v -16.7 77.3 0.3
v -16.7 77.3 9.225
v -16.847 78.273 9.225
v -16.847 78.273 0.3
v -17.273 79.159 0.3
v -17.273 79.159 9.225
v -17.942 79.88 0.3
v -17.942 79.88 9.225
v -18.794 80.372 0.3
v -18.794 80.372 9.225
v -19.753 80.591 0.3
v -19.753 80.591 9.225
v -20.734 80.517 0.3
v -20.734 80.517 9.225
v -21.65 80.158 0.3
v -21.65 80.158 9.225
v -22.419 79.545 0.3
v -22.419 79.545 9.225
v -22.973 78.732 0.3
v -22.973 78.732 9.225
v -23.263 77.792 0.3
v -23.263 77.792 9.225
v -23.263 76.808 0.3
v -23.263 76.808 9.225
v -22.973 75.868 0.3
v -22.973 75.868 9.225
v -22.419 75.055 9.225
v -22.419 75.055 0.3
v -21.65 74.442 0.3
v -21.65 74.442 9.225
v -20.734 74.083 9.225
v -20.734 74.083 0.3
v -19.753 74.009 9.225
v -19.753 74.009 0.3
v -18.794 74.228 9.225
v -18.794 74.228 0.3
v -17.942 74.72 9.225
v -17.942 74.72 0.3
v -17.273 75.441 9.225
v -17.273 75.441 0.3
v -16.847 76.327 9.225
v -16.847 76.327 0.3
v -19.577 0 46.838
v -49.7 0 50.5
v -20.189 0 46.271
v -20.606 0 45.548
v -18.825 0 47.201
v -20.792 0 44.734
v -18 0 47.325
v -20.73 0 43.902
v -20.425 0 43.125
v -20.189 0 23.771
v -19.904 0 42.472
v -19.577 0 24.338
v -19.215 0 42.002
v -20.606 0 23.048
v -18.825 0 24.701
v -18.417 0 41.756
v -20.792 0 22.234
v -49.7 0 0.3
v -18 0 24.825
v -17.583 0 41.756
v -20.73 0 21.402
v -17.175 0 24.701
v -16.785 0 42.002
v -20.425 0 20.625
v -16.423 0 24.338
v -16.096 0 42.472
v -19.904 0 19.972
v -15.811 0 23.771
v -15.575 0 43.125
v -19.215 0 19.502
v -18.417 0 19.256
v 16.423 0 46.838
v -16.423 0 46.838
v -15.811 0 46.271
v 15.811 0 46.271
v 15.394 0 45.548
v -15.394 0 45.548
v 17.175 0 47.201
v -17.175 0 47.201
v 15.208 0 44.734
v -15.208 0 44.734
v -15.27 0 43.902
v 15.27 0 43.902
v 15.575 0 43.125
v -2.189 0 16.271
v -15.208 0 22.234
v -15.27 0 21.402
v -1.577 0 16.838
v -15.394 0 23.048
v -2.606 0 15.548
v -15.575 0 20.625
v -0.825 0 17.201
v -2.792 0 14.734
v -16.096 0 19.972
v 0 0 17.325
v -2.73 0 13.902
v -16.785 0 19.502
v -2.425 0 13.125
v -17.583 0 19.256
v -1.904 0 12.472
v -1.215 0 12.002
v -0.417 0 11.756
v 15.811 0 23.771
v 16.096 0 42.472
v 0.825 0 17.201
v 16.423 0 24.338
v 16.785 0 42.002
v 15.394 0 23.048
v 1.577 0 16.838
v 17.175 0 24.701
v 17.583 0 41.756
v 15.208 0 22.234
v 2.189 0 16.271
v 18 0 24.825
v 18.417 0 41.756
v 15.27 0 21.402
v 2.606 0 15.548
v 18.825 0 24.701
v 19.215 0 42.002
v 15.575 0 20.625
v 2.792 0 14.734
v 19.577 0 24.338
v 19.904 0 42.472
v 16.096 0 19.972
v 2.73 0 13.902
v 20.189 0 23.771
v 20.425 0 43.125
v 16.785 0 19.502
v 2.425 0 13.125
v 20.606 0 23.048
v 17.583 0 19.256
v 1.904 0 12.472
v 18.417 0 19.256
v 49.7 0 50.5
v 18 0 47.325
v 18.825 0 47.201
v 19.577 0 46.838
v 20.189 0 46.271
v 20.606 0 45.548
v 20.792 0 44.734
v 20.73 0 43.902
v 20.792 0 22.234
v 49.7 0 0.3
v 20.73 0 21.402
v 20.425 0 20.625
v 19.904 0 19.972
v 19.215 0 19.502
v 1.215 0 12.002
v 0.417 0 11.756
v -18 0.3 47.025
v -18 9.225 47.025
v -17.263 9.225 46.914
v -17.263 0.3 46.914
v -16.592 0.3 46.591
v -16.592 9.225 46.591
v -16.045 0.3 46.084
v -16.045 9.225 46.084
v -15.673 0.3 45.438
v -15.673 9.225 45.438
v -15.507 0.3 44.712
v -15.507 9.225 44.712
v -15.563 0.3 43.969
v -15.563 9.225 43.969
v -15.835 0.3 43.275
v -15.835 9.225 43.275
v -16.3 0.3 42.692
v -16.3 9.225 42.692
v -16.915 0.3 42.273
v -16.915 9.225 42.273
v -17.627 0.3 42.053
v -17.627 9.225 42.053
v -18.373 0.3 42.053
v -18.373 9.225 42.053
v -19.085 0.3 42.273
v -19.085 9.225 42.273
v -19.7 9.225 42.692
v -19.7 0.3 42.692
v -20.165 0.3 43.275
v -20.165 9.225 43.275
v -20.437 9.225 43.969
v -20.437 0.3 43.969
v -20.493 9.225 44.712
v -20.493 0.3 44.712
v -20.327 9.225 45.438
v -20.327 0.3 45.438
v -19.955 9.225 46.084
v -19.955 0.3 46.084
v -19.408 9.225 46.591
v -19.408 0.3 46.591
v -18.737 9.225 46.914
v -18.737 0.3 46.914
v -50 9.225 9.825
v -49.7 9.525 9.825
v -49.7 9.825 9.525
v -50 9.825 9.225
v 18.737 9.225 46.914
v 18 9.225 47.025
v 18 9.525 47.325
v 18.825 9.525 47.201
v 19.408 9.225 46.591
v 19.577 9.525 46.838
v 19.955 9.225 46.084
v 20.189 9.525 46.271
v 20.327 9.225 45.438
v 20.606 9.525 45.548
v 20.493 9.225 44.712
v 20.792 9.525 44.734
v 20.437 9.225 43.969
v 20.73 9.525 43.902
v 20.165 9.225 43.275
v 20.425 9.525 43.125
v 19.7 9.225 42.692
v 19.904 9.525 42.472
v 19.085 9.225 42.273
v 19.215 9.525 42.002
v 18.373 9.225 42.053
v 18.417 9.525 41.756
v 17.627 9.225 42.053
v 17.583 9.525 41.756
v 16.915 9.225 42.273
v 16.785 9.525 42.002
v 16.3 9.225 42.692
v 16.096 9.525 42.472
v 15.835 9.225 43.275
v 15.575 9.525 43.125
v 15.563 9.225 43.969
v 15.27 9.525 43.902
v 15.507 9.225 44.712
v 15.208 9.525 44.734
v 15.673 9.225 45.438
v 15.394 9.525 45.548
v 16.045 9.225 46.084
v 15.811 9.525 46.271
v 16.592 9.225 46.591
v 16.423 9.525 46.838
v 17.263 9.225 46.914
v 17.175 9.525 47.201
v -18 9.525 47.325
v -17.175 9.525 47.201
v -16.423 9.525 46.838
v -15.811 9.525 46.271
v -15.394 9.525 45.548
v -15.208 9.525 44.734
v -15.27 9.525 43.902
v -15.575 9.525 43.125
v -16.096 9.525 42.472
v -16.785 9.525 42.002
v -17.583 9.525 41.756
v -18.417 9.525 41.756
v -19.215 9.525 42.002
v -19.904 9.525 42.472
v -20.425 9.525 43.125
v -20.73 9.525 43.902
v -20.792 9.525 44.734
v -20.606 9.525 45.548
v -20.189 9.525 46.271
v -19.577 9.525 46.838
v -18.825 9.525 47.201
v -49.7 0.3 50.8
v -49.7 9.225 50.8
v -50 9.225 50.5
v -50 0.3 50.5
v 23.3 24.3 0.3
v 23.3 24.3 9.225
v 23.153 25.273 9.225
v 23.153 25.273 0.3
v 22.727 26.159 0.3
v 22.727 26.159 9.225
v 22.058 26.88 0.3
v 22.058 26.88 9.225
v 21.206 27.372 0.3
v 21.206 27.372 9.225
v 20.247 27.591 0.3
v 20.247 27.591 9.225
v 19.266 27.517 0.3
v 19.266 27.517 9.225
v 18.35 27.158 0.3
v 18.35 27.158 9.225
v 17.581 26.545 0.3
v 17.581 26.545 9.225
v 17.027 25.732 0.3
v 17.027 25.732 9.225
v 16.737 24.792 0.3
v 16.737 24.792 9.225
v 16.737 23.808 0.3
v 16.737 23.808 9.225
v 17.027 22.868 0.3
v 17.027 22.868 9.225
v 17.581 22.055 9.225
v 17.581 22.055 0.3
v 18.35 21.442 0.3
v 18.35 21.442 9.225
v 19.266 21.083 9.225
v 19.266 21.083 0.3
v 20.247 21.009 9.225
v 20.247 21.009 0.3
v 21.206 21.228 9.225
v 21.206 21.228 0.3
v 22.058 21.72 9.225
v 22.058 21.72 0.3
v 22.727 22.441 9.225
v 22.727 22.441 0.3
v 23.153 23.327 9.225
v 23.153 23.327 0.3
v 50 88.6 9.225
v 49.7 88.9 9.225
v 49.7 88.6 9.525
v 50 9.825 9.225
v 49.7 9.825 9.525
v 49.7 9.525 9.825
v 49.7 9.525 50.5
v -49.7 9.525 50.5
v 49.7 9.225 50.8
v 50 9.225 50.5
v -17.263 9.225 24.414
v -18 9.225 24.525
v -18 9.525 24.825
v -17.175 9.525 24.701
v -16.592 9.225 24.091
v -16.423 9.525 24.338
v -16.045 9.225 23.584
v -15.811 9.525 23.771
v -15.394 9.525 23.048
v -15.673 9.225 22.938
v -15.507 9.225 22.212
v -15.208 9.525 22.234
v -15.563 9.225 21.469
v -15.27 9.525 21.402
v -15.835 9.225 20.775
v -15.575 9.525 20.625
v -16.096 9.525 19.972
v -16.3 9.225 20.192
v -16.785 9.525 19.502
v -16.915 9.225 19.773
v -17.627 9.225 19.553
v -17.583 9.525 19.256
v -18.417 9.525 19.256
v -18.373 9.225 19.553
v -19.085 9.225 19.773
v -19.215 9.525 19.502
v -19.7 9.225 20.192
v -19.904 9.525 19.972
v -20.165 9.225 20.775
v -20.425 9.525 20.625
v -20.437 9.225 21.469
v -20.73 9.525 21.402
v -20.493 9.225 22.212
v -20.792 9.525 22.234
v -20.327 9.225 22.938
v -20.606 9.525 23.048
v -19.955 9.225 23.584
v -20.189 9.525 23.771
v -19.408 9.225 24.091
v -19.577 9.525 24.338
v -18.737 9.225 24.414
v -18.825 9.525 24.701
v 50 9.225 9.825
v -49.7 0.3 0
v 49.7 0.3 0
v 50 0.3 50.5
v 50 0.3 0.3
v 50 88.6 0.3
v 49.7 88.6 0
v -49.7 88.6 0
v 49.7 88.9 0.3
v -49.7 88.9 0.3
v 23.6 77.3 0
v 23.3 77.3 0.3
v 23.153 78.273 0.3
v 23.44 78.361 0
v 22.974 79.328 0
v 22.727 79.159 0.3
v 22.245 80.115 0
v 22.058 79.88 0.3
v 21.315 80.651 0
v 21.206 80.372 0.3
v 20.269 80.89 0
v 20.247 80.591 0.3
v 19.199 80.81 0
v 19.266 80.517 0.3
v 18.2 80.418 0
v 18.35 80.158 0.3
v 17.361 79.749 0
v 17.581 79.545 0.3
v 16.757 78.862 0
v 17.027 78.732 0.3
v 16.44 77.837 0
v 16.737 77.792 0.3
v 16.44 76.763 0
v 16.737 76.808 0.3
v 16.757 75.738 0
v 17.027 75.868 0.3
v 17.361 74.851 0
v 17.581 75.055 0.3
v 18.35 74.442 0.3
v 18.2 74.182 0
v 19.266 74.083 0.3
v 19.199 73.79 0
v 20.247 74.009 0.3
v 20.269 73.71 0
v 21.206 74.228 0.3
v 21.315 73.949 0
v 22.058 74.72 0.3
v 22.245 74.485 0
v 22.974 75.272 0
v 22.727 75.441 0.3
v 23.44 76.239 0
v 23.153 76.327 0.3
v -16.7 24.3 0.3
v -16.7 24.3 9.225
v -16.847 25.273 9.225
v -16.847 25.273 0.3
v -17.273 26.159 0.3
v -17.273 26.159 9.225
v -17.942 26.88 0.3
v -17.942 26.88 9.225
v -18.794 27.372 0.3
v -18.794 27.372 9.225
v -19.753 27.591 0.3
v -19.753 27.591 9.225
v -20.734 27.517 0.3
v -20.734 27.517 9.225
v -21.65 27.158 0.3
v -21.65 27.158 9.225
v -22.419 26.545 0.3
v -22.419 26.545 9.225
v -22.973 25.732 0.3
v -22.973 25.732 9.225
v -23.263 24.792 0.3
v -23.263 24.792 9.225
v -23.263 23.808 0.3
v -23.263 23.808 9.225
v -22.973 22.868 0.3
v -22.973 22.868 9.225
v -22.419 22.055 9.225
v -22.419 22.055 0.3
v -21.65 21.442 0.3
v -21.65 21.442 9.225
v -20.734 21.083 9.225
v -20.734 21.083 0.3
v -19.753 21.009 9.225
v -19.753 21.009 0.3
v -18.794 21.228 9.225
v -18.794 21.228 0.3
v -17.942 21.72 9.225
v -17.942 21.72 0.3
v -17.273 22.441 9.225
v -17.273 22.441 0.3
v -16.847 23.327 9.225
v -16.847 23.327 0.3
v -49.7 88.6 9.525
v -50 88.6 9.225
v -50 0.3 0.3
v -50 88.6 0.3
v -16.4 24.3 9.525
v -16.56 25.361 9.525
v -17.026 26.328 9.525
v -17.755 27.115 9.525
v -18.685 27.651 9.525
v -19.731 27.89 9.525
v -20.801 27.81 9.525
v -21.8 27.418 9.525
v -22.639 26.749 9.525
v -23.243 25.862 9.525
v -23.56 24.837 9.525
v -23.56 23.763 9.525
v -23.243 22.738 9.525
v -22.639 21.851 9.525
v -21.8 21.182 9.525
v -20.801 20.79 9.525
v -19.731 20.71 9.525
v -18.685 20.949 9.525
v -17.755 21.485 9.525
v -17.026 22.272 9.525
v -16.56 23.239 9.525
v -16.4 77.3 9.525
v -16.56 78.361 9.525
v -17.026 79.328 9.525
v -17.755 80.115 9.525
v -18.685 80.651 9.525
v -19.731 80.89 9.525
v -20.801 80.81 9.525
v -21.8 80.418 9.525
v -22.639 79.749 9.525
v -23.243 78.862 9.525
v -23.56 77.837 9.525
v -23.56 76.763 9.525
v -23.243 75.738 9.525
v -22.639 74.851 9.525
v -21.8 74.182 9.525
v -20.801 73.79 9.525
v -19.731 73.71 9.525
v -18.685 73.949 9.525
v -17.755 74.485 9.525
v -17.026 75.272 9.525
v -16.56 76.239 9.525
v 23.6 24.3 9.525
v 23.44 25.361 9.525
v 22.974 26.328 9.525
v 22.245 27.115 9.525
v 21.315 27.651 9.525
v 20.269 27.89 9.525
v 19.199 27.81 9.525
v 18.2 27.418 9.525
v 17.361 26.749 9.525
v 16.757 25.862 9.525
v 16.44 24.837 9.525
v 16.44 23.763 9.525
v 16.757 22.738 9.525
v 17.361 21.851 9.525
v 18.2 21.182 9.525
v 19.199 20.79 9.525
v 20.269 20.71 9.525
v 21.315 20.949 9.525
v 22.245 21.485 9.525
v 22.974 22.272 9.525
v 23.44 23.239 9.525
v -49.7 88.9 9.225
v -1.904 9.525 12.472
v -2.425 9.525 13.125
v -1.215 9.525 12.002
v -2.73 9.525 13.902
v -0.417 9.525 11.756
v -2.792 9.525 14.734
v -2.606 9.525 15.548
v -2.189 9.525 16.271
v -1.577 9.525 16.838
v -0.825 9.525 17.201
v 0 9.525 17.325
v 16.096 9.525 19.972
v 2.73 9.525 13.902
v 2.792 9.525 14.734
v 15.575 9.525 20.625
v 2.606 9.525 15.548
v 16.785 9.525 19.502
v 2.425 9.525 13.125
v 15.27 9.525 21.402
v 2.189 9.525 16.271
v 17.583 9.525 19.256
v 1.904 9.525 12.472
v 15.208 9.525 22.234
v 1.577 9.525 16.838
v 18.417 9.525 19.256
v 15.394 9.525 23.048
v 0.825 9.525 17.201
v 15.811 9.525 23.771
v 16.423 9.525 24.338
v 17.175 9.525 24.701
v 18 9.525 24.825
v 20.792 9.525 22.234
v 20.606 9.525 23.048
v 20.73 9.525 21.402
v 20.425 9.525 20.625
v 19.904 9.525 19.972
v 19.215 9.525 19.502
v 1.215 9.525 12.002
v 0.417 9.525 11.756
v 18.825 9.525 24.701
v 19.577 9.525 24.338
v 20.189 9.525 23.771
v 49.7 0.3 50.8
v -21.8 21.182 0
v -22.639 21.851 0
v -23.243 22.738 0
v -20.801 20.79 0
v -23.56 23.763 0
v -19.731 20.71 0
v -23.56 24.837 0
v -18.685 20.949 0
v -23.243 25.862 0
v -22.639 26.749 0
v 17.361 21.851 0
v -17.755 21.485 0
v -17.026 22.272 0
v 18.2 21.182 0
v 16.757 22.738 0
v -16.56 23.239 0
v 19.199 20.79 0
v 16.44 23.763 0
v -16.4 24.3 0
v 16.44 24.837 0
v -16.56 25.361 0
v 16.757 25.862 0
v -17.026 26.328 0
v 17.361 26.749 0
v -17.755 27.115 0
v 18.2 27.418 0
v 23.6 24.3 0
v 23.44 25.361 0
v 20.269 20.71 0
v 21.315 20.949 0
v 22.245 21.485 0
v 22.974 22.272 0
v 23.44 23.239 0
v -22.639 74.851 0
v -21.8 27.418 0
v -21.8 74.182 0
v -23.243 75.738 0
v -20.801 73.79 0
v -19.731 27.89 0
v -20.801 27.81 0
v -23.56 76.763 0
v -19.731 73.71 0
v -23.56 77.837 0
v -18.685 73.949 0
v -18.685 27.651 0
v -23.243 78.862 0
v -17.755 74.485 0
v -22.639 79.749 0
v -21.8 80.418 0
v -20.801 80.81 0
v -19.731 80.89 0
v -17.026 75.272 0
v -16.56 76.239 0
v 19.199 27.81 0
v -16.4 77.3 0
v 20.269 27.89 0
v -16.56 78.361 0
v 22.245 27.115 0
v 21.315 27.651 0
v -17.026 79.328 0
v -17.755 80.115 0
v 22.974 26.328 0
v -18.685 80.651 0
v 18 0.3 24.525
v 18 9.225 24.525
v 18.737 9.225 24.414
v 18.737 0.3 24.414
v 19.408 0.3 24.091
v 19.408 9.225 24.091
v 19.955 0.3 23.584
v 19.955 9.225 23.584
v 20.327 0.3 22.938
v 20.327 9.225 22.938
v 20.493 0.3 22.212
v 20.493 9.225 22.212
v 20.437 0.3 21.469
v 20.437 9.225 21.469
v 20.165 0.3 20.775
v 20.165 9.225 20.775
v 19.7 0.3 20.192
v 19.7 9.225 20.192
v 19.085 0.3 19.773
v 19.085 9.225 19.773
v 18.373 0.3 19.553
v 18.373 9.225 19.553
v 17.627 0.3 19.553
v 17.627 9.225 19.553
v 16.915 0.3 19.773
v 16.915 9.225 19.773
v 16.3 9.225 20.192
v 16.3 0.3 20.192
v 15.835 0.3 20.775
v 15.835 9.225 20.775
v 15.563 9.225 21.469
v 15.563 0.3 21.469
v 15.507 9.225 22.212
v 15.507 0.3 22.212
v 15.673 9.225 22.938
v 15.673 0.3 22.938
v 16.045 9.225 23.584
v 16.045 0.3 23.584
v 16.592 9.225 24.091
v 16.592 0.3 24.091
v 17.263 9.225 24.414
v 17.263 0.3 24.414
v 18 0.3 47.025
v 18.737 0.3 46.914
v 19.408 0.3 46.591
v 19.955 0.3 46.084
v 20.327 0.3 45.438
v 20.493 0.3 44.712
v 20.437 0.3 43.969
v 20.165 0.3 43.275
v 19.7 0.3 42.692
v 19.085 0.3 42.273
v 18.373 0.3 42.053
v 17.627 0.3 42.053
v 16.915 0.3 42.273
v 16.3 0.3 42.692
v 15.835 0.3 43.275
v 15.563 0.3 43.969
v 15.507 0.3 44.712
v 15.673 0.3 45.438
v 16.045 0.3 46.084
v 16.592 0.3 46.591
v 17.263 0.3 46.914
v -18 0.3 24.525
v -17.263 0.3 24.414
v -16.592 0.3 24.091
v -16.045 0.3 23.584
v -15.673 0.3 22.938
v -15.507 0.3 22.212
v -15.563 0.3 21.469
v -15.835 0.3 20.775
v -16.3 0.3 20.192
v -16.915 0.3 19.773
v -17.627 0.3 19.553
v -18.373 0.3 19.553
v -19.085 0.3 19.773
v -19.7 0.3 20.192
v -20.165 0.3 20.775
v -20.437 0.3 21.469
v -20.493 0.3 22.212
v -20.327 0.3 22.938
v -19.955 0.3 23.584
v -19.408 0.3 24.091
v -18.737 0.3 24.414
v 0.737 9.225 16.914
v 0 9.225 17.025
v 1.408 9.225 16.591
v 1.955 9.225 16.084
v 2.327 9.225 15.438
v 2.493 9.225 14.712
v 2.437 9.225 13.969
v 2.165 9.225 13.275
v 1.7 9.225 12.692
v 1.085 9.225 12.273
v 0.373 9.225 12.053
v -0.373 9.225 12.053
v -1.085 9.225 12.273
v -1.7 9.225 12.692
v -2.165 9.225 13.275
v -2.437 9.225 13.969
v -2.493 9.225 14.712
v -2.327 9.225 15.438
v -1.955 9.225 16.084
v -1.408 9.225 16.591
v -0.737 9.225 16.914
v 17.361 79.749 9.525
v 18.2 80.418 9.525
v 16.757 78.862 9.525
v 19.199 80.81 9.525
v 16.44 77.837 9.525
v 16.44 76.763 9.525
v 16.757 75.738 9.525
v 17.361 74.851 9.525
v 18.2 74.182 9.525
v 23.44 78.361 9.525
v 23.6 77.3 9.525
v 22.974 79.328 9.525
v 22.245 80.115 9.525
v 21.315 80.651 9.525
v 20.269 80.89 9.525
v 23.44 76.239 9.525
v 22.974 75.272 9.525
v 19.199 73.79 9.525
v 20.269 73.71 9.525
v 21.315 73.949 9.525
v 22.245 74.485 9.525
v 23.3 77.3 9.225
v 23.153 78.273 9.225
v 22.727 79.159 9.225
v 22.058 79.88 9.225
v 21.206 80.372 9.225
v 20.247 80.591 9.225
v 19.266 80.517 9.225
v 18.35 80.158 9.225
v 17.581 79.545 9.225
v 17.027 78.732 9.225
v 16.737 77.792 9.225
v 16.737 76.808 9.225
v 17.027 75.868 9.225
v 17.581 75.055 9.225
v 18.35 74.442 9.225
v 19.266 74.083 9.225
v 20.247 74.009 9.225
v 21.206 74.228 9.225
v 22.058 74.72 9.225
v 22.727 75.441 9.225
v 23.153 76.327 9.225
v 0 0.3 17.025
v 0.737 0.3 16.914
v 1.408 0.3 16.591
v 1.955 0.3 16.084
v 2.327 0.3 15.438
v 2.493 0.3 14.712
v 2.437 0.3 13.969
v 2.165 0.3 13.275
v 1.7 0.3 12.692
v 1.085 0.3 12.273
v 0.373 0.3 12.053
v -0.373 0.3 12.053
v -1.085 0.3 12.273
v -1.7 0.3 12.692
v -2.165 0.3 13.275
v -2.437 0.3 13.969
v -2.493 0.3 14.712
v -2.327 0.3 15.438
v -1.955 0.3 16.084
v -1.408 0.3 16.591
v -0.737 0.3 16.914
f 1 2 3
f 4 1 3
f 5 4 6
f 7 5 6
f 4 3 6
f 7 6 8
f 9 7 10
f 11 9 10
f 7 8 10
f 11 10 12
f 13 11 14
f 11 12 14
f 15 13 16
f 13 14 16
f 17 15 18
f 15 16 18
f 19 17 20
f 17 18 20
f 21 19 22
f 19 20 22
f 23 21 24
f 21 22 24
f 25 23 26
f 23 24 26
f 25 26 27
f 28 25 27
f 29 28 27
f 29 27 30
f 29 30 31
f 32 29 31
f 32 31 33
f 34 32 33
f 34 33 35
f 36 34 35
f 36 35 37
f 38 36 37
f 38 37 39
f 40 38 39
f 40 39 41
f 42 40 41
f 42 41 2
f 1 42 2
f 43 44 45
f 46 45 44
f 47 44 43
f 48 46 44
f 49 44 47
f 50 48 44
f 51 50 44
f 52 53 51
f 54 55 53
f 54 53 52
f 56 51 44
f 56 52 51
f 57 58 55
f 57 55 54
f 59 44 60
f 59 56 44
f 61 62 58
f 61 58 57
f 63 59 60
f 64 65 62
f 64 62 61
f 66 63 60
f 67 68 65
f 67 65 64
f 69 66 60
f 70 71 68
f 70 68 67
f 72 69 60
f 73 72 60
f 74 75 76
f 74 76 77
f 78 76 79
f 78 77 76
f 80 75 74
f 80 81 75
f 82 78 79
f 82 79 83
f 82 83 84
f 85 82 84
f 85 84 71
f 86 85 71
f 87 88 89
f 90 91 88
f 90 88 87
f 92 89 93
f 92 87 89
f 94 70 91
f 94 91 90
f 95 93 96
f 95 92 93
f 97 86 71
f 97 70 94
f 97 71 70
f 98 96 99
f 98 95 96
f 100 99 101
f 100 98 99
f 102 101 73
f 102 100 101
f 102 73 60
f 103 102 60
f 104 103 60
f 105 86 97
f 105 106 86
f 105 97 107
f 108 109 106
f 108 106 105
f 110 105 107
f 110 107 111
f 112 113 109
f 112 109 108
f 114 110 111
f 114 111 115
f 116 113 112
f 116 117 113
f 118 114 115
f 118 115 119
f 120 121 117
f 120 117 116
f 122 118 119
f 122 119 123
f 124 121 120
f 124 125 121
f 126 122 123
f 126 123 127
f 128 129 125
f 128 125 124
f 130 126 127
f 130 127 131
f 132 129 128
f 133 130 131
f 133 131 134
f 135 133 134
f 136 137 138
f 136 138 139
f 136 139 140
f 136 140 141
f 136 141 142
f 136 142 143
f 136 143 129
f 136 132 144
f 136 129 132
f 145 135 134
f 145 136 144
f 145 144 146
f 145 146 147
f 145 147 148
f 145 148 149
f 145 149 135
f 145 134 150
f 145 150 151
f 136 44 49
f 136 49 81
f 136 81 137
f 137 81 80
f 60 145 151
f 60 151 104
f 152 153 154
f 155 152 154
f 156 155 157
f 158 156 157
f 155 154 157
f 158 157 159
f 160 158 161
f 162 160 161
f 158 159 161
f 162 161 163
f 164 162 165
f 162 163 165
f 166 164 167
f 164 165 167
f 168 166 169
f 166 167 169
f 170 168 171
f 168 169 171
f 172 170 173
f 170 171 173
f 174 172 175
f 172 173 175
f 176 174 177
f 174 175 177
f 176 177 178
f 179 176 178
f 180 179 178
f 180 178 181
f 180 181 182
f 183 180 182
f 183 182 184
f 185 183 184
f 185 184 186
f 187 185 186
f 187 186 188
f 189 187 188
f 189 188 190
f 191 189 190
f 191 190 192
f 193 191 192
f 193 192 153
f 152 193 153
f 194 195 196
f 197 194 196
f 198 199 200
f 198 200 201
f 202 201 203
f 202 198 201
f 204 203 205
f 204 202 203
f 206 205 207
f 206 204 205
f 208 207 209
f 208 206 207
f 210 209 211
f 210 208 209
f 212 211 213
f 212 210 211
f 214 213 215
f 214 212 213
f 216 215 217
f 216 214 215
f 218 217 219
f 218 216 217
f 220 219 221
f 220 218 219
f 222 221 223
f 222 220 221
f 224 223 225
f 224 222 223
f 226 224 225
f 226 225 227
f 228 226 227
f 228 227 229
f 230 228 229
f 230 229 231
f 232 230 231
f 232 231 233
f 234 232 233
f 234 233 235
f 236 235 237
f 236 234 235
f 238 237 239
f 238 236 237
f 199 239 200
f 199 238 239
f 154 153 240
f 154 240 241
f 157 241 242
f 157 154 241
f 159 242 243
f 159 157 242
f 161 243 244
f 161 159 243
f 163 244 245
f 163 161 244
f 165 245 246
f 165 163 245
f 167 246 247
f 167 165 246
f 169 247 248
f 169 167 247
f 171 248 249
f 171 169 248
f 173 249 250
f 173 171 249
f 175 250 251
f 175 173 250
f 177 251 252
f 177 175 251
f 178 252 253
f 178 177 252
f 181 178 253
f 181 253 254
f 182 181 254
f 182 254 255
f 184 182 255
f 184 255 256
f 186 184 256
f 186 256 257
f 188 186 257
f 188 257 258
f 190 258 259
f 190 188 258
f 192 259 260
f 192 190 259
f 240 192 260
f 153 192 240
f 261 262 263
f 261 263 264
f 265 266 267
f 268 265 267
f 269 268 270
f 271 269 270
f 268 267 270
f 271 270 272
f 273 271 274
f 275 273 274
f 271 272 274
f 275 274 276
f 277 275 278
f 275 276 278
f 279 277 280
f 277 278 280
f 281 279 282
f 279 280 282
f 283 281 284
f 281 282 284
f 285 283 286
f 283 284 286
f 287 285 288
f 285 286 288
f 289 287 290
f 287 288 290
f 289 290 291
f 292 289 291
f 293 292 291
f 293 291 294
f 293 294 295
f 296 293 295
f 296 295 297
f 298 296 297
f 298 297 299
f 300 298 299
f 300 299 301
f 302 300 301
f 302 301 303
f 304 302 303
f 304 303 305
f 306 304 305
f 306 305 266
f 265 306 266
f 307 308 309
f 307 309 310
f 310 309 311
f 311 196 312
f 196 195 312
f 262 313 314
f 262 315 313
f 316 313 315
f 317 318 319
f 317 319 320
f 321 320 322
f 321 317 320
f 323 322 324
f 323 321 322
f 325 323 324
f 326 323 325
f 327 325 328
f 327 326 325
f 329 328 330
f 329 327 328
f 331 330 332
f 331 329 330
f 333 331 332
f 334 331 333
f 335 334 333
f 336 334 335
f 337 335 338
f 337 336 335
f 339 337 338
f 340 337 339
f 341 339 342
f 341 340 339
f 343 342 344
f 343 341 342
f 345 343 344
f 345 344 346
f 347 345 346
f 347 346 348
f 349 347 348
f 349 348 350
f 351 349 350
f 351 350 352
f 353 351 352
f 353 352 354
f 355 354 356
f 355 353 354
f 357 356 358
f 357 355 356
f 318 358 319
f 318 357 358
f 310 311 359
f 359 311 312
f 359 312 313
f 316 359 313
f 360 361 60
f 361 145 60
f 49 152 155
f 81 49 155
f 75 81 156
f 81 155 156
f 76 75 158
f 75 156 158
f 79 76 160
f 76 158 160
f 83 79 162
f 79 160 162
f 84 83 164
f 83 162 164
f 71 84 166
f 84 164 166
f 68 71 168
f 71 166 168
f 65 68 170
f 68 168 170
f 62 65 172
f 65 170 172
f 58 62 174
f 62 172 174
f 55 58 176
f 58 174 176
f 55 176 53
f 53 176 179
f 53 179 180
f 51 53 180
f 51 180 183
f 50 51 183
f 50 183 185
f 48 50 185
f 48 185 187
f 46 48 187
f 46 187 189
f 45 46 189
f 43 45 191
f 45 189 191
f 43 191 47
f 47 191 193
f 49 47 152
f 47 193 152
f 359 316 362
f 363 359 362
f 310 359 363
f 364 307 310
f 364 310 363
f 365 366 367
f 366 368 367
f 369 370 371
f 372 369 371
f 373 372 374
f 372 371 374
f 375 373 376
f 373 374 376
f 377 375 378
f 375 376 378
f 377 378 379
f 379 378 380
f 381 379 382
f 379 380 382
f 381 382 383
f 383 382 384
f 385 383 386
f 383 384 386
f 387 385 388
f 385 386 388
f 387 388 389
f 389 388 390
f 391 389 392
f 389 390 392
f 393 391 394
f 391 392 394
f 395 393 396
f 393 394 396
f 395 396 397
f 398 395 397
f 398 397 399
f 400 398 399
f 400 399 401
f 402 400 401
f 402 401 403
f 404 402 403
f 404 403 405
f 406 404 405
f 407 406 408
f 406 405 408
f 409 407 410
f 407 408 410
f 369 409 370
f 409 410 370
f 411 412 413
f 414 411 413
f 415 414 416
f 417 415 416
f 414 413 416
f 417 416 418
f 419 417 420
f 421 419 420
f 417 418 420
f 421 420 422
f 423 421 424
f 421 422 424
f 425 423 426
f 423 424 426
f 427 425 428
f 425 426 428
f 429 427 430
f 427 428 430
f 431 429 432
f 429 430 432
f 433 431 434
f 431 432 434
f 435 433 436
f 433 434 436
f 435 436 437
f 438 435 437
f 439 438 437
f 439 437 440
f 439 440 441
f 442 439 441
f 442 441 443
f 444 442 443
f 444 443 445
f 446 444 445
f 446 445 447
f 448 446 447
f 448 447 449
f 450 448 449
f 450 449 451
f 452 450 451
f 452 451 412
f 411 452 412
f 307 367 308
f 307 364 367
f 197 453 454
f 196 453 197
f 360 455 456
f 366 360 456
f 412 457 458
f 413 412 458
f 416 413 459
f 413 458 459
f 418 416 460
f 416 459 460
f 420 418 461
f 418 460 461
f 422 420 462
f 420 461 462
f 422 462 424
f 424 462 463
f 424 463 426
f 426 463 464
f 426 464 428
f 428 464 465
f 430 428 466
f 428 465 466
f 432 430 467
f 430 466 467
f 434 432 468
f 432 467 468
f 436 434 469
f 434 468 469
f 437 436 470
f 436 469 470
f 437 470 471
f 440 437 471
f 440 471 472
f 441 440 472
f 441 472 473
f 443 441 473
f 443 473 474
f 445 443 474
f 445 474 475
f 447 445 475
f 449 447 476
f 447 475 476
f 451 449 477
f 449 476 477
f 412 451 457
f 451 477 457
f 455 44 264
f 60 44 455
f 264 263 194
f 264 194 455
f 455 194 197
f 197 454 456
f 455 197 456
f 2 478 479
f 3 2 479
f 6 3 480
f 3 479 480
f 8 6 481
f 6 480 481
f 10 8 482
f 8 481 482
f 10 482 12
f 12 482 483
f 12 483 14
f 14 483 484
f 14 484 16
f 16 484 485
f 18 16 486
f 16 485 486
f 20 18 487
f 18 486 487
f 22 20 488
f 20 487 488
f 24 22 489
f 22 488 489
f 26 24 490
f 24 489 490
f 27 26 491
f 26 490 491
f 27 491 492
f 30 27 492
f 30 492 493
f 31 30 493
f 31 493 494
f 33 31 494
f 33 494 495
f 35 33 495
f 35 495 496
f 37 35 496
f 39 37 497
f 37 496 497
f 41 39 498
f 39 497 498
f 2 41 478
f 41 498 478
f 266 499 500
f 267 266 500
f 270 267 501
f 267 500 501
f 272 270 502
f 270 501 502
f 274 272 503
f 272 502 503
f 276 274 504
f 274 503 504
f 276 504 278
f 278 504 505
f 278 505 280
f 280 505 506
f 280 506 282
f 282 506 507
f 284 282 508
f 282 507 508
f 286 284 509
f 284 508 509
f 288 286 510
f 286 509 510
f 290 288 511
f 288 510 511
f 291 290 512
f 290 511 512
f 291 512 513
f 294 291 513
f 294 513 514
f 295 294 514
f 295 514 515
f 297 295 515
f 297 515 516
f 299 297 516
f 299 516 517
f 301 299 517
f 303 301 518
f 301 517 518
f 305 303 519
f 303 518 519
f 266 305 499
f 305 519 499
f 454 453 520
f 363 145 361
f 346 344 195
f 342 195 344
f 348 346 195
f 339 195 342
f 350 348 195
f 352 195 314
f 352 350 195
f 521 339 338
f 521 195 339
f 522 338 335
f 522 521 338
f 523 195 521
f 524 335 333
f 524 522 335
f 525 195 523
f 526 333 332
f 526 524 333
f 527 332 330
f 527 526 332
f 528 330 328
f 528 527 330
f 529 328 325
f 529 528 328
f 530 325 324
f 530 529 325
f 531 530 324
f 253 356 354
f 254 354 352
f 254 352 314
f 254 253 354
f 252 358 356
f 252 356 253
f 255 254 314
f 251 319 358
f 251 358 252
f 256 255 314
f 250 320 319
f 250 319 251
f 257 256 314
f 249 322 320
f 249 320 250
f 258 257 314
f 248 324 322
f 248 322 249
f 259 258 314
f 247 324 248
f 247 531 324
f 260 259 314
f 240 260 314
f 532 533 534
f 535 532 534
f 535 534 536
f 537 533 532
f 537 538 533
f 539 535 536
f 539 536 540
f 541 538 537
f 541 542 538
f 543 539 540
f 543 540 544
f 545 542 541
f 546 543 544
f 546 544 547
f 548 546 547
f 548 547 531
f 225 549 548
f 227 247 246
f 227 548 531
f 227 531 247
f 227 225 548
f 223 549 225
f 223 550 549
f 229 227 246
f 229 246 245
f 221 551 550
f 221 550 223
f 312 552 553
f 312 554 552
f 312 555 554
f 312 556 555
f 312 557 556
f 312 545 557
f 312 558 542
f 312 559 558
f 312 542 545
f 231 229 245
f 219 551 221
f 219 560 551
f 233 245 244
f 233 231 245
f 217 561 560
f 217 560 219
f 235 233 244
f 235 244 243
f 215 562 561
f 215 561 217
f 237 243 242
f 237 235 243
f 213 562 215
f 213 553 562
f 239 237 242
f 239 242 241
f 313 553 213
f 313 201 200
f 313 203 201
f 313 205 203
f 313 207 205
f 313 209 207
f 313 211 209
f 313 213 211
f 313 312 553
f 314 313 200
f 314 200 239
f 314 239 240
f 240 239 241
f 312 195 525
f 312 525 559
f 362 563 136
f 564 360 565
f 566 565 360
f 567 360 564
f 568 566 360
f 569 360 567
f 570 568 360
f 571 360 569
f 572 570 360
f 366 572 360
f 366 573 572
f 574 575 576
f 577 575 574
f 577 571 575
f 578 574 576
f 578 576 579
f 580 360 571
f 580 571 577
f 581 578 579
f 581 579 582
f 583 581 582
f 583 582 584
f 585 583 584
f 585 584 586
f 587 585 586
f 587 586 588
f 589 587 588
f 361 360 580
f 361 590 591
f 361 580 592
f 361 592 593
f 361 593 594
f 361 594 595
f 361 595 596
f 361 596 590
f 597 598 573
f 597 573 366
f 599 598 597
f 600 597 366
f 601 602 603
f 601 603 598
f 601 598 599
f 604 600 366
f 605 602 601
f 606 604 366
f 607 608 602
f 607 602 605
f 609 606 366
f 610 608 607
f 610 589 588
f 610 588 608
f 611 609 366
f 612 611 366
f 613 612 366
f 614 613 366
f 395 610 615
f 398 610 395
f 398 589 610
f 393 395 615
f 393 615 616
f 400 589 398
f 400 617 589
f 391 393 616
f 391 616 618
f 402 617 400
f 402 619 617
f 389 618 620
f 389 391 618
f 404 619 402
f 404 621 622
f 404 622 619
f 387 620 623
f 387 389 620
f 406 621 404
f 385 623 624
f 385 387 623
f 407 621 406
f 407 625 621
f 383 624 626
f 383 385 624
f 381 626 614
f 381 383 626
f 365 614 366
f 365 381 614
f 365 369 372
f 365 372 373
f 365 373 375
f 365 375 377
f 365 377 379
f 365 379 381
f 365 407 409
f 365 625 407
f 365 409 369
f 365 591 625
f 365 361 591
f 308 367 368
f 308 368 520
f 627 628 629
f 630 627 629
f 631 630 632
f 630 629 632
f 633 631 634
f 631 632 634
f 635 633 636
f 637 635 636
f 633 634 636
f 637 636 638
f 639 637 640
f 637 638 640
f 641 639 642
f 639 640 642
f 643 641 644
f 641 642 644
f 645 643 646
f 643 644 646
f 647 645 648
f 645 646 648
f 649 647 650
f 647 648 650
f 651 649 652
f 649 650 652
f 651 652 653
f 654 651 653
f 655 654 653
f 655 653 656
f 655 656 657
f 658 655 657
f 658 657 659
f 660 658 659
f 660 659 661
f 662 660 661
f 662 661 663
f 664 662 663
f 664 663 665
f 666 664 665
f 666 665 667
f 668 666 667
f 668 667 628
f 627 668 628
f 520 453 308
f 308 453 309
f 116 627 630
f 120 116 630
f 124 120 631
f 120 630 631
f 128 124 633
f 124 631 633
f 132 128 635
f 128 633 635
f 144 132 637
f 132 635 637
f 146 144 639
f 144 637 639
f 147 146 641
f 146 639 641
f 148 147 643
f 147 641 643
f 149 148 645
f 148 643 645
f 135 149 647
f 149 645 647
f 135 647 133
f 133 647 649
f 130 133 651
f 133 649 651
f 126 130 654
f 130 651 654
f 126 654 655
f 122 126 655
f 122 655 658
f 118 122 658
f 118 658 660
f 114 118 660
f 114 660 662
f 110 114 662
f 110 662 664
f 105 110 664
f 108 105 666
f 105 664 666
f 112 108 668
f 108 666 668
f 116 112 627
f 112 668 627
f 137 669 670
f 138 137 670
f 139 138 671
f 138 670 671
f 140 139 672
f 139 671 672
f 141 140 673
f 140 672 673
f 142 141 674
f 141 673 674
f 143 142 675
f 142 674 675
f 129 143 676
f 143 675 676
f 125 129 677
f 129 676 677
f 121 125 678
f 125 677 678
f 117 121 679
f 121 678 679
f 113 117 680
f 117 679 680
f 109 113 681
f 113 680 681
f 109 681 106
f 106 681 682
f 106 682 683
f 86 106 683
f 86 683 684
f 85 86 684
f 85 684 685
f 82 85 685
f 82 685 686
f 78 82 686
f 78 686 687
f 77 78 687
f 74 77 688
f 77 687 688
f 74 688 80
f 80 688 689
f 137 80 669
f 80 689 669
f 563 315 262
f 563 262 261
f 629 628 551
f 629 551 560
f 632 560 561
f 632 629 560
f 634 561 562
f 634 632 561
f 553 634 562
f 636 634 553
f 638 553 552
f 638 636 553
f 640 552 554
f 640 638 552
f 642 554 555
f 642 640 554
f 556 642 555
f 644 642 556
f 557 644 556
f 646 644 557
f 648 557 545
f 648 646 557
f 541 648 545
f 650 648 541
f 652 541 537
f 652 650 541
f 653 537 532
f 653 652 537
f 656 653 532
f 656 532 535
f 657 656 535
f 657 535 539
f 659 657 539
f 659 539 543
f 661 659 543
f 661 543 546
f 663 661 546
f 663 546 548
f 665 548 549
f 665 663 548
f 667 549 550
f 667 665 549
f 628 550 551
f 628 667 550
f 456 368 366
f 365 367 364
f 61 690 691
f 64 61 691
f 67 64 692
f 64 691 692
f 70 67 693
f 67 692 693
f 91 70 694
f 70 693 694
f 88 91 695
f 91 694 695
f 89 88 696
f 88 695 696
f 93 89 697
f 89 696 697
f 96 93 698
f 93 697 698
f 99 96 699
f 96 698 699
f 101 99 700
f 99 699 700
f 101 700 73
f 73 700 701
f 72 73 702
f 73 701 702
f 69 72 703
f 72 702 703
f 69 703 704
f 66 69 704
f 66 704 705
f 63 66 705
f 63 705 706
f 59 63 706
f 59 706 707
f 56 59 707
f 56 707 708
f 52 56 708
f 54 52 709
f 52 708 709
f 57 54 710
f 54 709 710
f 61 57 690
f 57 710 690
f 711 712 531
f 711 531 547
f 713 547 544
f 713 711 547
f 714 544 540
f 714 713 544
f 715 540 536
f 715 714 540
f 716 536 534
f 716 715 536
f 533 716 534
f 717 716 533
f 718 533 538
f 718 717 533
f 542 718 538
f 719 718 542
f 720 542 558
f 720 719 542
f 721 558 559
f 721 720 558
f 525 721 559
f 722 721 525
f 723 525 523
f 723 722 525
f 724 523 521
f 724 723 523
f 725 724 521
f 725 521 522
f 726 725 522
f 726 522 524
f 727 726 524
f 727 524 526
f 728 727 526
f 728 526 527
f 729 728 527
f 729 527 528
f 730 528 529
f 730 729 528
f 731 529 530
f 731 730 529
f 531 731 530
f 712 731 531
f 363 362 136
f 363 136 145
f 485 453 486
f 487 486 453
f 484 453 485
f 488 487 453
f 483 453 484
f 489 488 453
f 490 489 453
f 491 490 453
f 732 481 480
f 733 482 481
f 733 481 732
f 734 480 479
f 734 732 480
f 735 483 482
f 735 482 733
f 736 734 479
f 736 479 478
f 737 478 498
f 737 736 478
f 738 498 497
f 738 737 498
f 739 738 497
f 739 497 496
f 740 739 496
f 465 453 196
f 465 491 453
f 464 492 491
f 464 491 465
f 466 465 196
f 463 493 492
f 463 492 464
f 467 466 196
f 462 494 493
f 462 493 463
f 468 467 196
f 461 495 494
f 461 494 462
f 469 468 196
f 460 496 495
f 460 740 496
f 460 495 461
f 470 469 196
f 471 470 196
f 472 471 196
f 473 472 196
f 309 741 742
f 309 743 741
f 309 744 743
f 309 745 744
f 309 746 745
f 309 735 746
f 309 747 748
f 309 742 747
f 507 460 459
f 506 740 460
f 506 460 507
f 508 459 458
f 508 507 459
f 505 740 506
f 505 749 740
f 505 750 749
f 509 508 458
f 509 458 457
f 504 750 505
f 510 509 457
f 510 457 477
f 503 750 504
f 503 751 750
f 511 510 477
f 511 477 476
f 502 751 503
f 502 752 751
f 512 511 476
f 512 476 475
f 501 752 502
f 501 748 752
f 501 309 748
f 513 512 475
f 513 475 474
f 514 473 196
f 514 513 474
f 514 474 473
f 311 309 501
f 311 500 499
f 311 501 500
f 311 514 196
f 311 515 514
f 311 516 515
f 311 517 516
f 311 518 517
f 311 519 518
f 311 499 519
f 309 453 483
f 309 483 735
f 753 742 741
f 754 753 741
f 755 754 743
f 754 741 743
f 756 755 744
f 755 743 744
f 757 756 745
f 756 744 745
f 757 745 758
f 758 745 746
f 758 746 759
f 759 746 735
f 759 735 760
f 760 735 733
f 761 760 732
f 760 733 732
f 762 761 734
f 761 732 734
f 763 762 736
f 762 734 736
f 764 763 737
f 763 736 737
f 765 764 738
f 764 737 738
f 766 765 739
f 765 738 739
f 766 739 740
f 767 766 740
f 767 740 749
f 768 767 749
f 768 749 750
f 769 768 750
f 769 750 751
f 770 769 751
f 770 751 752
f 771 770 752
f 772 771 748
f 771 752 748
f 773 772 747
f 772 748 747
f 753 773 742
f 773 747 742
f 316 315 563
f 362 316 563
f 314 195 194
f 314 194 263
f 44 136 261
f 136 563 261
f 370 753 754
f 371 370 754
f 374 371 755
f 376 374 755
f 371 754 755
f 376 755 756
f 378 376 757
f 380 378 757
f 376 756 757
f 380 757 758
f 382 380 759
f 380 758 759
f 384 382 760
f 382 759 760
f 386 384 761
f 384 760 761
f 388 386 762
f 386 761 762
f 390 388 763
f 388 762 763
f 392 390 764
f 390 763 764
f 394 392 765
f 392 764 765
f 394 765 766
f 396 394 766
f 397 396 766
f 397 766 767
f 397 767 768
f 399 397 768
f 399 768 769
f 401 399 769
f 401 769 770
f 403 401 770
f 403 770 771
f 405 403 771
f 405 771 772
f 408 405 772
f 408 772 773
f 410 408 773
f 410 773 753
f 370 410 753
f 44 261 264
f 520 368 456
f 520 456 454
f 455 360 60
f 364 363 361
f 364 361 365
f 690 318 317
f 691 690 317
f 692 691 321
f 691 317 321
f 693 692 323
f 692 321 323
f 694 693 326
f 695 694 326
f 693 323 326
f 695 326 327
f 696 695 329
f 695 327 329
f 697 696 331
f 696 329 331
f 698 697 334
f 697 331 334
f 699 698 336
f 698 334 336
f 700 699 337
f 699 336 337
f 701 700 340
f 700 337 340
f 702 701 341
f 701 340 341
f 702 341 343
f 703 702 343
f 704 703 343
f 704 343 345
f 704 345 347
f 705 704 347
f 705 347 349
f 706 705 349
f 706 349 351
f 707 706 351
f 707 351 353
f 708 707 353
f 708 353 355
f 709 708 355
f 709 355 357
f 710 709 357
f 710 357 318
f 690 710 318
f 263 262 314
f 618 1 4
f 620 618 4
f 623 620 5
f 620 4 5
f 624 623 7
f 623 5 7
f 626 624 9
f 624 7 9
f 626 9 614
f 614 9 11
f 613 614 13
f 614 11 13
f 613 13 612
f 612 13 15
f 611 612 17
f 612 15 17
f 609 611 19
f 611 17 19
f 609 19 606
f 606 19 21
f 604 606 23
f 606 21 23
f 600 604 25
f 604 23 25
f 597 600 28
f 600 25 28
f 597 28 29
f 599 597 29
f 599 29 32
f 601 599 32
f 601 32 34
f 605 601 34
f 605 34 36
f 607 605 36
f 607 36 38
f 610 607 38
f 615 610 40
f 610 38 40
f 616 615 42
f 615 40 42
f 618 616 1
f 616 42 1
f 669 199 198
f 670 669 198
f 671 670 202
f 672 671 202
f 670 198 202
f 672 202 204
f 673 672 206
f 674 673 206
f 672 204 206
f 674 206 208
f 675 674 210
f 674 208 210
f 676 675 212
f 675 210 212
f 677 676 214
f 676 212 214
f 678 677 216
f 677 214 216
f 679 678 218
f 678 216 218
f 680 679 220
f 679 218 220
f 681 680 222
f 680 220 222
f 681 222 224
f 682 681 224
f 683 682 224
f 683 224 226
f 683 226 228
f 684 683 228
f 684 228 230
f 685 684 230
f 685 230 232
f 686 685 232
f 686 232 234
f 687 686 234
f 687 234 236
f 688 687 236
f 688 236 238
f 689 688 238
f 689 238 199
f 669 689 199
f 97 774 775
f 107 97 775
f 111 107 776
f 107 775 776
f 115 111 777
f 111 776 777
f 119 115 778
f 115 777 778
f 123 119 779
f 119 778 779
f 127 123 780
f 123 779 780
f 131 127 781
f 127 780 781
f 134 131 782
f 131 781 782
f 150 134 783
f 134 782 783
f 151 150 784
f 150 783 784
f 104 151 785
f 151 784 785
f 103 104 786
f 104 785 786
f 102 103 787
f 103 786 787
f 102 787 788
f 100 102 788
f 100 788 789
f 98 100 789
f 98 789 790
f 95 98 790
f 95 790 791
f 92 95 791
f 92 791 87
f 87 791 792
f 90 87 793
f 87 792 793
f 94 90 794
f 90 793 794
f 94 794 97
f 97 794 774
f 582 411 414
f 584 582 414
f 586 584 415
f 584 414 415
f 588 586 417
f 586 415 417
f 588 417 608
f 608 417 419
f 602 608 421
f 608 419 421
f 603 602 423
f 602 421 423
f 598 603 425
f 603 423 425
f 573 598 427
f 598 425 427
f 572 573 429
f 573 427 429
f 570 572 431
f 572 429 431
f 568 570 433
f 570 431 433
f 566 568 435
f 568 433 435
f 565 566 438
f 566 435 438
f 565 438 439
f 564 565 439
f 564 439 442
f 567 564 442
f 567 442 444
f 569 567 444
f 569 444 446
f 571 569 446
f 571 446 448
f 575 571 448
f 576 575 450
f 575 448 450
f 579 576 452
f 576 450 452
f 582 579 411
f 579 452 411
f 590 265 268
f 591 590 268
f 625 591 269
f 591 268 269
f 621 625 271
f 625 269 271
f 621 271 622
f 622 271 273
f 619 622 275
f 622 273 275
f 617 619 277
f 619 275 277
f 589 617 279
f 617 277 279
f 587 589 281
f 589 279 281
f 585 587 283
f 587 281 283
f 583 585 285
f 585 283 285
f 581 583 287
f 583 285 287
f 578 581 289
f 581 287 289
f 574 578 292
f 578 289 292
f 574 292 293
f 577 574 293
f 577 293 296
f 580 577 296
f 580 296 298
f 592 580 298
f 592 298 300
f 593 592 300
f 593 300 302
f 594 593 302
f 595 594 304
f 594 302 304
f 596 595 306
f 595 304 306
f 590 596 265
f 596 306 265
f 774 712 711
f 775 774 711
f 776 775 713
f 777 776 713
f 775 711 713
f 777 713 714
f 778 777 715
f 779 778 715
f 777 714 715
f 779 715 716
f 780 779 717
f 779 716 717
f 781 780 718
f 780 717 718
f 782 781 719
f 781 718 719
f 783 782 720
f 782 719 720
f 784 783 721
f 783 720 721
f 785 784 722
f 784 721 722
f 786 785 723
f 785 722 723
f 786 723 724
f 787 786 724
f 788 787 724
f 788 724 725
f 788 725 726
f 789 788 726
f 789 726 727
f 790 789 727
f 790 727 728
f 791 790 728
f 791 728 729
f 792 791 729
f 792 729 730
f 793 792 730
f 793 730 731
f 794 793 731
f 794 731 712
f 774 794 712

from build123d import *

# Parameters (mm, degrees)
BOSS_EXTRUDE1_DEPTH = 50
SKETCH2_R           = 3.3
CUT_EXTRUDE1_DEPTH  = 100
SKETCH3_R           = 2.5
CUT_EXTRUDE2_DEPTH  = 100
CHAMFER1_SIZE       = 0.3


with BuildPart() as part:
    # Sketch1 → Boss-Extrude1 (new, symmetric)
    with BuildSketch(Plane(origin=(0, 0, 0), x_dir=(0, 0, -1), z_dir=(1, 0, 0))):
        Polygon((0, 0), (0, 88.9), (-9.525, 88.9), (-9.525, 9.525), (-50.8, 9.525), (-50.8, 0), align=None)
    extrude(amount=BOSS_EXTRUDE1_DEPTH, both=True)

    # Sketch2 → Cut-Extrude1 (cut)
    with BuildSketch(Plane.XY.offset(9.525)):
        with Locations((-20, 77.3)):
            Circle(SKETCH2_R)
        with Locations((20, 77.3)):
            Circle(SKETCH2_R)
        with Locations((20, 24.3)):
            Circle(SKETCH2_R)
        with Locations((-20, 24.3)):
            Circle(SKETCH2_R)
    extrude(amount=-CUT_EXTRUDE1_DEPTH, mode=Mode.SUBTRACT)

    # Sketch3 → Cut-Extrude2 (cut)
    with BuildSketch(Plane(origin=(0, 9.525, 0), x_dir=(1, 0, 0), z_dir=(0, 1, 0))):
        with Locations(Location((-18, -22.025, 0), (0, 0, 270))):
            Circle(SKETCH3_R)
        with Locations(Location((-18, -44.525, 0), (0, 0, 270))):
            Circle(SKETCH3_R)
        with Locations(Location((18, -44.525, 0), (0, 0, 270))):
            Circle(SKETCH3_R)
        with Locations(Location((18, -22.025, 0), (0, 0, 270))):
            Circle(SKETCH3_R)
        with Locations(Location((0, -14.525, 0), (0, 0, 270))):
            Circle(SKETCH3_R)
    extrude(amount=-CUT_EXTRUDE2_DEPTH, mode=Mode.SUBTRACT)

    # Chamfer1
    chamfer1_edges = [part.edges().sort_by_distance(p)[0] for p in [
        (50, 88.9, 4.7625),
        (0, 0, 50.8),
        (0, 9.525, 50.8),
        (0, 9.525, 9.525),
        (0, 88.9, 9.525),
        (0, 88.9, 0),
        (0, 0, 0),
        (50, 49.2125, 9.525),
        (50, 9.525, 30.1625),
        (50, 4.7625, 50.8),
        (-23.3, 77.3, 0),
        (-23.3, 77.3, 9.525),
        (16.7, 77.3, 0),
        (16.7, 77.3, 9.525),
        (16.7, 24.3, 0),
        (16.7, 24.3, 9.525),
        (-23.3, 24.3, 0),
        (-23.3, 24.3, 9.525),
        (-18, 0, 19.525),
        (50, 0, 25.4),
        (-18, 9.525, 19.525),
        (-18, 0, 42.025),
        (-18, 9.525, 42.025),
        (18, 0, 42.025),
        (18, 9.525, 42.025),
        (18, 0, 19.525),
        (18, 9.525, 19.525),
        (0, 0, 12.025),
        (0, 9.525, 12.025),
        (-50, 4.7625, 50.8),
        (-50, 9.525, 30.1625),
        (-50, 49.2125, 9.525),
        (50, 44.45, 0),
        (-50, 88.9, 4.7625),
        (-50, 44.45, 0),
        (-50, 0, 25.4),
    ]]
    chamfer(chamfer1_edges, length=CHAMFER1_SIZE)


solid = part.part
